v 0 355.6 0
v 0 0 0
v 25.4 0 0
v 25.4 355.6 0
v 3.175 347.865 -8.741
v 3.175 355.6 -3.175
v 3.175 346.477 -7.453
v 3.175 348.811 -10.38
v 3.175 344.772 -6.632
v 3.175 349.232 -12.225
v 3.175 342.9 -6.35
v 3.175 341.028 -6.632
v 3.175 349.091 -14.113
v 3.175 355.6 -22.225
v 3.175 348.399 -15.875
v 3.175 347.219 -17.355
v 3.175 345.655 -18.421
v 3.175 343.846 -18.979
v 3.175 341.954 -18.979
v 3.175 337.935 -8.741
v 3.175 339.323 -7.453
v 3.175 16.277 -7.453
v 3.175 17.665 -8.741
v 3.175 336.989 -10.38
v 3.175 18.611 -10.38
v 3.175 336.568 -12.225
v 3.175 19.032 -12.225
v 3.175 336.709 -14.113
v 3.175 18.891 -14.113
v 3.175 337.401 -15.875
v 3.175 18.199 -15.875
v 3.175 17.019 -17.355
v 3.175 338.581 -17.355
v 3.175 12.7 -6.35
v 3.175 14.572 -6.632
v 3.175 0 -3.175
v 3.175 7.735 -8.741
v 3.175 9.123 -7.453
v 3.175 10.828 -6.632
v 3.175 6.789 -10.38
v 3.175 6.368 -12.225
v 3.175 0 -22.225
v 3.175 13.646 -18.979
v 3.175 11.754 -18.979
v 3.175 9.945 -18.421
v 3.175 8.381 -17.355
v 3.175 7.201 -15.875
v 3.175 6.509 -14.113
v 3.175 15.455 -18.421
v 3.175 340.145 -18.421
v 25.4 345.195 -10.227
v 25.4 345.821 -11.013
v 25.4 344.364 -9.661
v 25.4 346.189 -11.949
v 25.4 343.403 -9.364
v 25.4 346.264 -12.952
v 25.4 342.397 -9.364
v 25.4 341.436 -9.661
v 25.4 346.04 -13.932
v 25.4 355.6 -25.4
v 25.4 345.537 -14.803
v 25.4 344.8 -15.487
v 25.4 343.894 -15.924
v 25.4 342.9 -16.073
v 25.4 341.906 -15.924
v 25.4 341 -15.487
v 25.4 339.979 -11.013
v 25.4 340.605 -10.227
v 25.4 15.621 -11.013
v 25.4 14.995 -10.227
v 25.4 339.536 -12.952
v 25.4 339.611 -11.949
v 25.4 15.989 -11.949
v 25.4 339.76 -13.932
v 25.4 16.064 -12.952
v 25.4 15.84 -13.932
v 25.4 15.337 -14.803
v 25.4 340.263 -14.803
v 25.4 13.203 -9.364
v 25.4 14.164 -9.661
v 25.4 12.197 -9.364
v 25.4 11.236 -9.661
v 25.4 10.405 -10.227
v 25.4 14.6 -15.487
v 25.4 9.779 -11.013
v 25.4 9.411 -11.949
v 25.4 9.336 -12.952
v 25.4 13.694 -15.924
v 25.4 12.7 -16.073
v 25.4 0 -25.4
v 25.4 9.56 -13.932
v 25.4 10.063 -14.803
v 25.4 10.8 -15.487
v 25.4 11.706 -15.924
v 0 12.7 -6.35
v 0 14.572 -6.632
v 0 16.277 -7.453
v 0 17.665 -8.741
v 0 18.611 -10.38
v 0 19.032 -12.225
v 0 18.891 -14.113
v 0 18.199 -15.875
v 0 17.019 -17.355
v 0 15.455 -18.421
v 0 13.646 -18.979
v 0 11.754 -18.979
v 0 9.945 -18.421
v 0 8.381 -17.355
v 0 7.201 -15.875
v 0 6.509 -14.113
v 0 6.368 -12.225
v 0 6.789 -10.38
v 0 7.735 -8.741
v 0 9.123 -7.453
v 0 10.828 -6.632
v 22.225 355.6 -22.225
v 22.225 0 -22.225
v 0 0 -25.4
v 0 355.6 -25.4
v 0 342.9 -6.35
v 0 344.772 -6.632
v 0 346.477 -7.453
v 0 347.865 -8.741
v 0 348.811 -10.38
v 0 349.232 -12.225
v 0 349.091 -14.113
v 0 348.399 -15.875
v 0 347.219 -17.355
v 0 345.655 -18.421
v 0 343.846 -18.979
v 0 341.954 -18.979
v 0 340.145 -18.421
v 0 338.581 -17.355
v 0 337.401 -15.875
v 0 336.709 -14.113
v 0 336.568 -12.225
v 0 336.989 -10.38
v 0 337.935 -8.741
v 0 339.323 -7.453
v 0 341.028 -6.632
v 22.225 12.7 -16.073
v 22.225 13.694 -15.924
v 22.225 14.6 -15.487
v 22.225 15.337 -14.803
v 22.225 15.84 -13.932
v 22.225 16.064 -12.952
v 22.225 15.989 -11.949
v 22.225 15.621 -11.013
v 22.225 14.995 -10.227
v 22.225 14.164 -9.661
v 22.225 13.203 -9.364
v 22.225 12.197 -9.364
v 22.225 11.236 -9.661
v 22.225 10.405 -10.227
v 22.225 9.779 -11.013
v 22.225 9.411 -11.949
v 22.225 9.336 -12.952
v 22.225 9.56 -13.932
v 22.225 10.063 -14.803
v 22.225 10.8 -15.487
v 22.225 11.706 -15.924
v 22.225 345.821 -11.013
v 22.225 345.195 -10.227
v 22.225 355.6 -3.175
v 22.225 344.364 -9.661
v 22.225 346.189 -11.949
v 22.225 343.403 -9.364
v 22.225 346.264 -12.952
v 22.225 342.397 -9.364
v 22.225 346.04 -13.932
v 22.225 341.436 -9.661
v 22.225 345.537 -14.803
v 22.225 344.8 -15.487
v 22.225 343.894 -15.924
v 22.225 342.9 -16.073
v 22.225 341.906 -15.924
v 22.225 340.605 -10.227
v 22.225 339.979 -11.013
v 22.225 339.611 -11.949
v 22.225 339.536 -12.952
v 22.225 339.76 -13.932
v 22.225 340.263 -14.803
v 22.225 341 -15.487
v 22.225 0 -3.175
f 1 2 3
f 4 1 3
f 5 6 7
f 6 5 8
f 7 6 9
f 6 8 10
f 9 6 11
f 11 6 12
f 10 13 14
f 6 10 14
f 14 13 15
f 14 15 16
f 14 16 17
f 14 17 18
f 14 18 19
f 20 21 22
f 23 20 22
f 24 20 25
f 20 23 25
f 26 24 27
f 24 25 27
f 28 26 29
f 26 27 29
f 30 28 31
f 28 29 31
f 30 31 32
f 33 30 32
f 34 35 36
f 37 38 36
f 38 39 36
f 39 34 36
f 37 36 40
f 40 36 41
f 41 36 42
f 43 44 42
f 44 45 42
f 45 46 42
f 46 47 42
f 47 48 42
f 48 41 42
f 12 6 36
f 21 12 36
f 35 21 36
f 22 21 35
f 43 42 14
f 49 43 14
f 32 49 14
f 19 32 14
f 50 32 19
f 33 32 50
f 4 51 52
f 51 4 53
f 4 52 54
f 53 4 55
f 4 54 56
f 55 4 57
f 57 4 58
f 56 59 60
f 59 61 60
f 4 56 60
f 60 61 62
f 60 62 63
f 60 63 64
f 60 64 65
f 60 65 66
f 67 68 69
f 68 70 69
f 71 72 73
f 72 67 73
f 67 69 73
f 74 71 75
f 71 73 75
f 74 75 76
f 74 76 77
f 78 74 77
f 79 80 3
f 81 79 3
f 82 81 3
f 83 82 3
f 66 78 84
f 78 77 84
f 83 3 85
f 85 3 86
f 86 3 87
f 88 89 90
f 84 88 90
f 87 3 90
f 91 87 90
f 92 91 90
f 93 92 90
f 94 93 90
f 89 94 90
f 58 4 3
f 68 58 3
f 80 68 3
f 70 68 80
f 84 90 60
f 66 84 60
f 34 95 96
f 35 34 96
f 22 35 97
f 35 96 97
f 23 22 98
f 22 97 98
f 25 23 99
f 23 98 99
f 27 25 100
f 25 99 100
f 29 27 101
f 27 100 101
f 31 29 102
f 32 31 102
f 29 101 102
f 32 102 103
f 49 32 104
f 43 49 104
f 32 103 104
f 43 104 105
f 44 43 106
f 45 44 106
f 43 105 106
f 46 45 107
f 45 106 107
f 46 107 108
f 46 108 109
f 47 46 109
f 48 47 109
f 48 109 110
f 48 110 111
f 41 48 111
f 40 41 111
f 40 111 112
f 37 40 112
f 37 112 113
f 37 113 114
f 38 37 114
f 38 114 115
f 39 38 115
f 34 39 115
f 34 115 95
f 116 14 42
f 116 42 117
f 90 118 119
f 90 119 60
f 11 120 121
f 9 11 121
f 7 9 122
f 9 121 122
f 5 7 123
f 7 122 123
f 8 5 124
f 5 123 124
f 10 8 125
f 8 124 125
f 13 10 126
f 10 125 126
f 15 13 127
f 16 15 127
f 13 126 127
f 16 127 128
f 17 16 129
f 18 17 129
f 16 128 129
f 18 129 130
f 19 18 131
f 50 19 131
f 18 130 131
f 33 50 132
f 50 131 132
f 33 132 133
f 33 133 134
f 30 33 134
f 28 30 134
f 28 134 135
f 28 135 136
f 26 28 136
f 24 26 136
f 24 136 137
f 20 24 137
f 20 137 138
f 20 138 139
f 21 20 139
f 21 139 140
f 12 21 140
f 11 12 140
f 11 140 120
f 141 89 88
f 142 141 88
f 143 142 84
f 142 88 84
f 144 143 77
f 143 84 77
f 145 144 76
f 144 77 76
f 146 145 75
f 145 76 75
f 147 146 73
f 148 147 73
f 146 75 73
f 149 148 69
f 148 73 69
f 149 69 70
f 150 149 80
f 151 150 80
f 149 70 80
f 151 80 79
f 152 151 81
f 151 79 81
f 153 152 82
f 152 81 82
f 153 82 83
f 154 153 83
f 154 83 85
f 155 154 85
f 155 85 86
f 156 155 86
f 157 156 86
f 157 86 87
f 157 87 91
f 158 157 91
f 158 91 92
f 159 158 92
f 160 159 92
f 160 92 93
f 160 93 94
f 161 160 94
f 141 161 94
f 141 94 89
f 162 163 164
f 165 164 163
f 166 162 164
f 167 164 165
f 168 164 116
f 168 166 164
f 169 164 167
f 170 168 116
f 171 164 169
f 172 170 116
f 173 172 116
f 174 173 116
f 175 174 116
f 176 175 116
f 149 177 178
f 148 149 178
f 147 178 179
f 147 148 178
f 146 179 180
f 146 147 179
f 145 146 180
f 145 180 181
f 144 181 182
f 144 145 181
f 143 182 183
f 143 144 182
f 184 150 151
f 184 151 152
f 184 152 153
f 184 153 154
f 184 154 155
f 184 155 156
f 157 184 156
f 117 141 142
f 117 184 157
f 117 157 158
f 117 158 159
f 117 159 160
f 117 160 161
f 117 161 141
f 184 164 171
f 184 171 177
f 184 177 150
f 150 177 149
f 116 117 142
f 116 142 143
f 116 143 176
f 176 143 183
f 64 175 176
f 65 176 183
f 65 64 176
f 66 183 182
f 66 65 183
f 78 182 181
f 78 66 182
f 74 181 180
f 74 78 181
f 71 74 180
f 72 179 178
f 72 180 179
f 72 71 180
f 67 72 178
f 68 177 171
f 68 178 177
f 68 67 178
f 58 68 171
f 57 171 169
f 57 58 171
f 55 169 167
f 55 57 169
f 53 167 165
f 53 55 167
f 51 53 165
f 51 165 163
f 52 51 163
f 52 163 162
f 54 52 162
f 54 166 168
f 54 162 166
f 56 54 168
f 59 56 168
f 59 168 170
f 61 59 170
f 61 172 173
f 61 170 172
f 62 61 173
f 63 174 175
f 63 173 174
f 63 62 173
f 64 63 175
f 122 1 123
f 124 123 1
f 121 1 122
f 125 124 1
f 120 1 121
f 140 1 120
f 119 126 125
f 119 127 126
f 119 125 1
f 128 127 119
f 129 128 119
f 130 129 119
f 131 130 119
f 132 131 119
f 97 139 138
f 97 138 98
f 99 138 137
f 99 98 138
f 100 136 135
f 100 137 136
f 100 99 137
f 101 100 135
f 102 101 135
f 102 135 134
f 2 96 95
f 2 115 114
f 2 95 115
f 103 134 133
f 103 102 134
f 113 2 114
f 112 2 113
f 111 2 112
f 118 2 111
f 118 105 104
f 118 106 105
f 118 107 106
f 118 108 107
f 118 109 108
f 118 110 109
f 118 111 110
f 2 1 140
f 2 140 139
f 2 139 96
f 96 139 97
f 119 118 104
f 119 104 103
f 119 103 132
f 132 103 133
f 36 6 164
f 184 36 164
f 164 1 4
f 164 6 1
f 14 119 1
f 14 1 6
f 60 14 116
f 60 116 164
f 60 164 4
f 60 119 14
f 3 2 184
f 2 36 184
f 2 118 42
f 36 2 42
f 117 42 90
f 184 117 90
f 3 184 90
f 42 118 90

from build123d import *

# Parameters (mm, degrees)
SKETCH1_W           = 25.4
SKETCH1_H           = 25.4
SKETCH1_W_2         = 19.05
SKETCH1_H_2         = 19.05
BOSS_EXTRUDE1_DEPTH = 355.6
SKETCH2_R           = 3.3734375
CUT_EXTRUDE1_DEPTH  = 358.409680899
CUT_EXTRUDE2_REACH  = 359.41
SKETCH3_R           = 6.35


with BuildPart() as part:
    # Sketch1 → Boss-Extrude1 (new body)
    with BuildSketch(Plane(origin=(0, 0, 0), x_dir=(1, 0, 0), z_dir=(0, 1, 0))):
        with Locations((12.7, 12.7)):
            Rectangle(SKETCH1_W, SKETCH1_H)
        with Locations((12.7, 12.7)):
            Rectangle(SKETCH1_W_2, SKETCH1_H_2, mode=Mode.SUBTRACT)
    extrude(amount=BOSS_EXTRUDE1_DEPTH)

    # Sketch2 → Cut-Extrude1 (cut, through all)
    with BuildSketch(Plane(origin=(25.4, 0, 0), x_dir=(0, 0, -1), z_dir=(1, 0, 0))):
        with Locations((12.7, 12.7)):
            Circle(SKETCH2_R)
    cut_extrude1 = extrude(amount=-CUT_EXTRUDE1_DEPTH, mode=Mode.SUBTRACT)

    # Mirror1: Cut-Extrude1 across plane
    add(cut_extrude1.mirror(Plane.ZX.offset(177.8)), mode=Mode.SUBTRACT)

    # Sketch3 → Cut-Extrude2 (cut, up to next)
    with BuildSketch(Plane.ZY, mode=Mode.PRIVATE) as cut_extrude2_sk1:
        with Locations((-12.7, 342.9)):
            Circle(SKETCH3_R)
    cut_extrude2_tool1 = extrude(cut_extrude2_sk1.sketch, amount=-CUT_EXTRUDE2_REACH, mode=Mode.PRIVATE) & part.part
    # Sketch3 → Cut-Extrude2 (cut, up to next)
    with BuildSketch(Plane.ZY, mode=Mode.PRIVATE) as cut_extrude2_sk2:
        with Locations((-12.7, 12.7)):
            Circle(SKETCH3_R)
    cut_extrude2_tool2 = extrude(cut_extrude2_sk2.sketch, amount=-CUT_EXTRUDE2_REACH, mode=Mode.PRIVATE) & part.part
    add(cut_extrude2_tool1.solids().sort_by_distance((0, 342.9, -12.7))[0], mode=Mode.SUBTRACT)
    add(cut_extrude2_tool2.solids().sort_by_distance((0, 12.7, -12.7))[0], mode=Mode.SUBTRACT)


solid = part.part
